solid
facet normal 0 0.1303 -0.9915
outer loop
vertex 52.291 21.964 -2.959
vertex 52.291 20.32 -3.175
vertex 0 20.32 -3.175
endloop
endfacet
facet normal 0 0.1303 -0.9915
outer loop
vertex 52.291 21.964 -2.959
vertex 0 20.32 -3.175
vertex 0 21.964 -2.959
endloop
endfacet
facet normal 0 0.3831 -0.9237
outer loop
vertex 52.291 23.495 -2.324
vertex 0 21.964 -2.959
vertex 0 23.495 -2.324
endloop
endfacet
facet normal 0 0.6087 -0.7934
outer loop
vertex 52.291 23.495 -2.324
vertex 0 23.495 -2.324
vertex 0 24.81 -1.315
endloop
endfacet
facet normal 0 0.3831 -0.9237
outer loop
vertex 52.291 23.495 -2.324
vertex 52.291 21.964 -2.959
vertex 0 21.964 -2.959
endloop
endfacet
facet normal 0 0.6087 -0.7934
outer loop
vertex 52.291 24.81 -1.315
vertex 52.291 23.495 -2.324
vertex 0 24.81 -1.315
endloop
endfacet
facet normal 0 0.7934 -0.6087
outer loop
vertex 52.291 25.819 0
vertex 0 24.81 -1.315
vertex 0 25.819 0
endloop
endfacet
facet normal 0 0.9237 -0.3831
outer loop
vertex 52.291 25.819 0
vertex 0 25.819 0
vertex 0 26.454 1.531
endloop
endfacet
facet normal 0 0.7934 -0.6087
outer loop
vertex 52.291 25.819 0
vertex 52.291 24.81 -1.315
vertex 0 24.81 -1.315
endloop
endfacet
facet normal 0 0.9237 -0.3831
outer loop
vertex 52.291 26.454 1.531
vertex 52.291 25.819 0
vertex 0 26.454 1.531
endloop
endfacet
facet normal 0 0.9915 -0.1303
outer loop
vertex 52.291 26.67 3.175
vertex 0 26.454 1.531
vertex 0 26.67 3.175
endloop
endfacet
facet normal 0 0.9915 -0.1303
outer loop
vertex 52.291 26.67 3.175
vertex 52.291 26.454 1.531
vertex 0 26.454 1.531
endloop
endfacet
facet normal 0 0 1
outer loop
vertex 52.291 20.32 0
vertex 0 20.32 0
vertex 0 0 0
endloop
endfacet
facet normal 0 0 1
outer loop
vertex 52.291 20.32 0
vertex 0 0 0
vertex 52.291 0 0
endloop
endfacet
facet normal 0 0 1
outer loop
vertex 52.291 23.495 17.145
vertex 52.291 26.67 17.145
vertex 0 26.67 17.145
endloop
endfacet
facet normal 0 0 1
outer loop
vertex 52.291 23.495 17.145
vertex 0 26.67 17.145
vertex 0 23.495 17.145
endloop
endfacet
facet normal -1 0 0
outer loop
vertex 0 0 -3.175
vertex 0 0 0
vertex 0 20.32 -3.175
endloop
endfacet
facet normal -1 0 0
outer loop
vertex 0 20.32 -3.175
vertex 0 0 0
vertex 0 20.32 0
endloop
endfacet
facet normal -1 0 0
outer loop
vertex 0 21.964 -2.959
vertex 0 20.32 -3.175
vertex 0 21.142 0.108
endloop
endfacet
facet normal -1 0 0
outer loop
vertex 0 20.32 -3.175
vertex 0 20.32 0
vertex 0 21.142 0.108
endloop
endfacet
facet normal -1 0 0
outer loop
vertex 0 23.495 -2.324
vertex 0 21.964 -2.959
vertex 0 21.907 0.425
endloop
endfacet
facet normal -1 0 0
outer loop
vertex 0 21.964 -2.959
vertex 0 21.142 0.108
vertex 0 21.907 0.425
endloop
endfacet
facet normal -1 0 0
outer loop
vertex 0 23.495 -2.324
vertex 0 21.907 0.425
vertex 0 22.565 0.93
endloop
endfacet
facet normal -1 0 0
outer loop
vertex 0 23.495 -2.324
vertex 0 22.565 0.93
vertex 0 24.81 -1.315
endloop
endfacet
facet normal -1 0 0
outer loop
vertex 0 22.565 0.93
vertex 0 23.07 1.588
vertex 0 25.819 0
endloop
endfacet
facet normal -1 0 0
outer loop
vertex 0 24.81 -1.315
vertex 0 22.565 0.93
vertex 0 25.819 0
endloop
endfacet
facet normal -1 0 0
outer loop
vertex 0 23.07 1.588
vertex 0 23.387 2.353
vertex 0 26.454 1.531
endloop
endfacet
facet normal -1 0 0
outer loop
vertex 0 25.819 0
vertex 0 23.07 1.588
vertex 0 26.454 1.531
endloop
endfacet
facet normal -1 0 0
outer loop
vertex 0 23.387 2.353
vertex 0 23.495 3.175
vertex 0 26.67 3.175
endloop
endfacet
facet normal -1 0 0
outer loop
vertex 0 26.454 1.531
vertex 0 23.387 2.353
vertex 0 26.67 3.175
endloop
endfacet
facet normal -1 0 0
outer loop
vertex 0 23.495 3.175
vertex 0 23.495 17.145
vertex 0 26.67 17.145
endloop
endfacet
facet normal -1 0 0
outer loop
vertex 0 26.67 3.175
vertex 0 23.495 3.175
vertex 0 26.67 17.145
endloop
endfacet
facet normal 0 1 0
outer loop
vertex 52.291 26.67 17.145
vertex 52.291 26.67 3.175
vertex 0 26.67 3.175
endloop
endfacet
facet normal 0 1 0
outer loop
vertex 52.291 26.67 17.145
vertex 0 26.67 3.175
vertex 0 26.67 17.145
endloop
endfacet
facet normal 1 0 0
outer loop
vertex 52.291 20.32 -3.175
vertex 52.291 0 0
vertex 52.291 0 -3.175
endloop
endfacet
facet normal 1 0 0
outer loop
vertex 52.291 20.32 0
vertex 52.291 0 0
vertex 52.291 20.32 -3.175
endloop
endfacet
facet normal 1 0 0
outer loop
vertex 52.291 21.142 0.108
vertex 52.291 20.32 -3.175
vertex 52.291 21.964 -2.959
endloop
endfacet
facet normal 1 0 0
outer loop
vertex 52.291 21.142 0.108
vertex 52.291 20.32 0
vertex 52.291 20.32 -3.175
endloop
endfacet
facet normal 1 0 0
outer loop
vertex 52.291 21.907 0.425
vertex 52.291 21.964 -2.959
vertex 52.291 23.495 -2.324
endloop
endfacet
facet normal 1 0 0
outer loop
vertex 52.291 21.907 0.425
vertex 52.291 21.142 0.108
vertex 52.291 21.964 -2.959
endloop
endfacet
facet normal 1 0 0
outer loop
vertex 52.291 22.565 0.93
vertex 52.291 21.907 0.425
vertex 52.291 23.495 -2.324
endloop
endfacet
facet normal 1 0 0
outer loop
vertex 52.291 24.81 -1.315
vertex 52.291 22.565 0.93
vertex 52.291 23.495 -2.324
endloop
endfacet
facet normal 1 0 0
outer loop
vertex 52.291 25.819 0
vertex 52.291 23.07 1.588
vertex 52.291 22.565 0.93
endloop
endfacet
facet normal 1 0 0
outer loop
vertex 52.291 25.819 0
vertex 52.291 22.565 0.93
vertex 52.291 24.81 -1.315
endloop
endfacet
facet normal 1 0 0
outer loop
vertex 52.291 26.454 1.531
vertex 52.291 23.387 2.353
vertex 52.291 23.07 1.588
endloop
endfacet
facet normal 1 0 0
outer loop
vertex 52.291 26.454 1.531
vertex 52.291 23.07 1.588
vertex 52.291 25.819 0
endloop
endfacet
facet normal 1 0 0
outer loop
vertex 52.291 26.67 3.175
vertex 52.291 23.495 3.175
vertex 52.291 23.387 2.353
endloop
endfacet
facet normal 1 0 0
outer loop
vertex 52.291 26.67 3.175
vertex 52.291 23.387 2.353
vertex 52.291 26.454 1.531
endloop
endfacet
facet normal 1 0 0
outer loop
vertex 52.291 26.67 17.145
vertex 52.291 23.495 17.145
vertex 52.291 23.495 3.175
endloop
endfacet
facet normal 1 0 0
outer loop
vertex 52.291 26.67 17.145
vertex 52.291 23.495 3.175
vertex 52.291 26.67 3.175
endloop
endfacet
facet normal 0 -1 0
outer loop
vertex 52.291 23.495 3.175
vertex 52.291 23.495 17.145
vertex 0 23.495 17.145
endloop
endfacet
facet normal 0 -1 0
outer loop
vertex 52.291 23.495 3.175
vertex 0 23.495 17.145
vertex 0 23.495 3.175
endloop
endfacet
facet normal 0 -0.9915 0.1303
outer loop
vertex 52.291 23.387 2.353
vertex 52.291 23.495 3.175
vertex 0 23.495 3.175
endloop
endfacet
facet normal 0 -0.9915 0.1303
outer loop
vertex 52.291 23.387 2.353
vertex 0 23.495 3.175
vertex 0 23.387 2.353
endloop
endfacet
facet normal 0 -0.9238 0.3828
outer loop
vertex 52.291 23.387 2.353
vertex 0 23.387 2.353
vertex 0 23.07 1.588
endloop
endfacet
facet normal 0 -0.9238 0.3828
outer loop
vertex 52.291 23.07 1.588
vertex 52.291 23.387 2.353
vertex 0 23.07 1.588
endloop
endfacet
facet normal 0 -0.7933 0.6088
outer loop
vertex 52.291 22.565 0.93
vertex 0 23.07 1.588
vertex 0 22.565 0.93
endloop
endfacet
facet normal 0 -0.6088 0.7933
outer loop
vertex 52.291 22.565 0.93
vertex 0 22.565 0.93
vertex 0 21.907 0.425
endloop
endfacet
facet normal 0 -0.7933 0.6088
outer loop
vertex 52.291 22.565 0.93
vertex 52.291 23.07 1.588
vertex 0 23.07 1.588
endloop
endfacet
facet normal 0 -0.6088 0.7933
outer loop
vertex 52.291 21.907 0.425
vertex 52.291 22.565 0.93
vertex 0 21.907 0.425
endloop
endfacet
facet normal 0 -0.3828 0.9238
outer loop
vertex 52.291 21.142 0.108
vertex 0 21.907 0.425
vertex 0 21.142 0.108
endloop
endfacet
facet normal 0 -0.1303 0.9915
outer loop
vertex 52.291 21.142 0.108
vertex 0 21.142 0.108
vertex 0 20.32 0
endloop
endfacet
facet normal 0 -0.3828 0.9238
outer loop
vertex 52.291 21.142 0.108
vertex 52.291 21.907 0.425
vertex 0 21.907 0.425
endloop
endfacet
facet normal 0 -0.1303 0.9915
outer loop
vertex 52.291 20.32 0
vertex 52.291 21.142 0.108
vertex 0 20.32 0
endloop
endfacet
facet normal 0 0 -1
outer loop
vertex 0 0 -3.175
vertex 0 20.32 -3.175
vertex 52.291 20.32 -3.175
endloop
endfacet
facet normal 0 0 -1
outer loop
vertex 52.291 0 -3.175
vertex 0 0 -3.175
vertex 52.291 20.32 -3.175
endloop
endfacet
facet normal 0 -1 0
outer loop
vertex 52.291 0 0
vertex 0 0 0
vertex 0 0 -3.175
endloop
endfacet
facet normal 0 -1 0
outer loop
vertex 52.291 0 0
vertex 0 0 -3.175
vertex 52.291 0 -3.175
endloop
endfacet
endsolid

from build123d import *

# Parameters (mm, degrees)
SKETCH2_W          = 52.291467072
SKETCH2_H          = 20.32
BASE_FLANGE1_DEPTH = 3.175
EDGE_FLANGE1_DEPTH = 52.291467072


# Sheet-metal steps are written as plain solids
with BuildPart() as part:
    # Sketch2 → Base-Flange1 (new body)
    with BuildSketch(Plane.XY):
        with Locations((26.145733536, 10.16)):
            Rectangle(SKETCH2_W, SKETCH2_H)
    extrude(amount=-BASE_FLANGE1_DEPTH)

    # Edge-Flange1 section (across the edge) → Edge-Flange1 (add)
    with BuildSketch(Plane(origin=(52.291467072, 23.495, 0), x_dir=(0, -1, 0), z_dir=(-1, 0, 0))):
        with BuildLine():
            Line((-3.175, 3.175), (-3.175, 17.145))
            Line((-3.175, 17.145), (0, 17.145))
            Line((0, 17.145), (0, 3.175))
            ThreePointArc((0, 3.175), (0.92993597, 0.92993597), (3.175, 0))
            Line((3.175, 0), (3.175, -3.175))
            ThreePointArc((3.175, -3.175), (-1.315128061, -1.315128061), (-3.175, 3.175))
        make_face()
    extrude(amount=EDGE_FLANGE1_DEPTH)


solid = part.part
